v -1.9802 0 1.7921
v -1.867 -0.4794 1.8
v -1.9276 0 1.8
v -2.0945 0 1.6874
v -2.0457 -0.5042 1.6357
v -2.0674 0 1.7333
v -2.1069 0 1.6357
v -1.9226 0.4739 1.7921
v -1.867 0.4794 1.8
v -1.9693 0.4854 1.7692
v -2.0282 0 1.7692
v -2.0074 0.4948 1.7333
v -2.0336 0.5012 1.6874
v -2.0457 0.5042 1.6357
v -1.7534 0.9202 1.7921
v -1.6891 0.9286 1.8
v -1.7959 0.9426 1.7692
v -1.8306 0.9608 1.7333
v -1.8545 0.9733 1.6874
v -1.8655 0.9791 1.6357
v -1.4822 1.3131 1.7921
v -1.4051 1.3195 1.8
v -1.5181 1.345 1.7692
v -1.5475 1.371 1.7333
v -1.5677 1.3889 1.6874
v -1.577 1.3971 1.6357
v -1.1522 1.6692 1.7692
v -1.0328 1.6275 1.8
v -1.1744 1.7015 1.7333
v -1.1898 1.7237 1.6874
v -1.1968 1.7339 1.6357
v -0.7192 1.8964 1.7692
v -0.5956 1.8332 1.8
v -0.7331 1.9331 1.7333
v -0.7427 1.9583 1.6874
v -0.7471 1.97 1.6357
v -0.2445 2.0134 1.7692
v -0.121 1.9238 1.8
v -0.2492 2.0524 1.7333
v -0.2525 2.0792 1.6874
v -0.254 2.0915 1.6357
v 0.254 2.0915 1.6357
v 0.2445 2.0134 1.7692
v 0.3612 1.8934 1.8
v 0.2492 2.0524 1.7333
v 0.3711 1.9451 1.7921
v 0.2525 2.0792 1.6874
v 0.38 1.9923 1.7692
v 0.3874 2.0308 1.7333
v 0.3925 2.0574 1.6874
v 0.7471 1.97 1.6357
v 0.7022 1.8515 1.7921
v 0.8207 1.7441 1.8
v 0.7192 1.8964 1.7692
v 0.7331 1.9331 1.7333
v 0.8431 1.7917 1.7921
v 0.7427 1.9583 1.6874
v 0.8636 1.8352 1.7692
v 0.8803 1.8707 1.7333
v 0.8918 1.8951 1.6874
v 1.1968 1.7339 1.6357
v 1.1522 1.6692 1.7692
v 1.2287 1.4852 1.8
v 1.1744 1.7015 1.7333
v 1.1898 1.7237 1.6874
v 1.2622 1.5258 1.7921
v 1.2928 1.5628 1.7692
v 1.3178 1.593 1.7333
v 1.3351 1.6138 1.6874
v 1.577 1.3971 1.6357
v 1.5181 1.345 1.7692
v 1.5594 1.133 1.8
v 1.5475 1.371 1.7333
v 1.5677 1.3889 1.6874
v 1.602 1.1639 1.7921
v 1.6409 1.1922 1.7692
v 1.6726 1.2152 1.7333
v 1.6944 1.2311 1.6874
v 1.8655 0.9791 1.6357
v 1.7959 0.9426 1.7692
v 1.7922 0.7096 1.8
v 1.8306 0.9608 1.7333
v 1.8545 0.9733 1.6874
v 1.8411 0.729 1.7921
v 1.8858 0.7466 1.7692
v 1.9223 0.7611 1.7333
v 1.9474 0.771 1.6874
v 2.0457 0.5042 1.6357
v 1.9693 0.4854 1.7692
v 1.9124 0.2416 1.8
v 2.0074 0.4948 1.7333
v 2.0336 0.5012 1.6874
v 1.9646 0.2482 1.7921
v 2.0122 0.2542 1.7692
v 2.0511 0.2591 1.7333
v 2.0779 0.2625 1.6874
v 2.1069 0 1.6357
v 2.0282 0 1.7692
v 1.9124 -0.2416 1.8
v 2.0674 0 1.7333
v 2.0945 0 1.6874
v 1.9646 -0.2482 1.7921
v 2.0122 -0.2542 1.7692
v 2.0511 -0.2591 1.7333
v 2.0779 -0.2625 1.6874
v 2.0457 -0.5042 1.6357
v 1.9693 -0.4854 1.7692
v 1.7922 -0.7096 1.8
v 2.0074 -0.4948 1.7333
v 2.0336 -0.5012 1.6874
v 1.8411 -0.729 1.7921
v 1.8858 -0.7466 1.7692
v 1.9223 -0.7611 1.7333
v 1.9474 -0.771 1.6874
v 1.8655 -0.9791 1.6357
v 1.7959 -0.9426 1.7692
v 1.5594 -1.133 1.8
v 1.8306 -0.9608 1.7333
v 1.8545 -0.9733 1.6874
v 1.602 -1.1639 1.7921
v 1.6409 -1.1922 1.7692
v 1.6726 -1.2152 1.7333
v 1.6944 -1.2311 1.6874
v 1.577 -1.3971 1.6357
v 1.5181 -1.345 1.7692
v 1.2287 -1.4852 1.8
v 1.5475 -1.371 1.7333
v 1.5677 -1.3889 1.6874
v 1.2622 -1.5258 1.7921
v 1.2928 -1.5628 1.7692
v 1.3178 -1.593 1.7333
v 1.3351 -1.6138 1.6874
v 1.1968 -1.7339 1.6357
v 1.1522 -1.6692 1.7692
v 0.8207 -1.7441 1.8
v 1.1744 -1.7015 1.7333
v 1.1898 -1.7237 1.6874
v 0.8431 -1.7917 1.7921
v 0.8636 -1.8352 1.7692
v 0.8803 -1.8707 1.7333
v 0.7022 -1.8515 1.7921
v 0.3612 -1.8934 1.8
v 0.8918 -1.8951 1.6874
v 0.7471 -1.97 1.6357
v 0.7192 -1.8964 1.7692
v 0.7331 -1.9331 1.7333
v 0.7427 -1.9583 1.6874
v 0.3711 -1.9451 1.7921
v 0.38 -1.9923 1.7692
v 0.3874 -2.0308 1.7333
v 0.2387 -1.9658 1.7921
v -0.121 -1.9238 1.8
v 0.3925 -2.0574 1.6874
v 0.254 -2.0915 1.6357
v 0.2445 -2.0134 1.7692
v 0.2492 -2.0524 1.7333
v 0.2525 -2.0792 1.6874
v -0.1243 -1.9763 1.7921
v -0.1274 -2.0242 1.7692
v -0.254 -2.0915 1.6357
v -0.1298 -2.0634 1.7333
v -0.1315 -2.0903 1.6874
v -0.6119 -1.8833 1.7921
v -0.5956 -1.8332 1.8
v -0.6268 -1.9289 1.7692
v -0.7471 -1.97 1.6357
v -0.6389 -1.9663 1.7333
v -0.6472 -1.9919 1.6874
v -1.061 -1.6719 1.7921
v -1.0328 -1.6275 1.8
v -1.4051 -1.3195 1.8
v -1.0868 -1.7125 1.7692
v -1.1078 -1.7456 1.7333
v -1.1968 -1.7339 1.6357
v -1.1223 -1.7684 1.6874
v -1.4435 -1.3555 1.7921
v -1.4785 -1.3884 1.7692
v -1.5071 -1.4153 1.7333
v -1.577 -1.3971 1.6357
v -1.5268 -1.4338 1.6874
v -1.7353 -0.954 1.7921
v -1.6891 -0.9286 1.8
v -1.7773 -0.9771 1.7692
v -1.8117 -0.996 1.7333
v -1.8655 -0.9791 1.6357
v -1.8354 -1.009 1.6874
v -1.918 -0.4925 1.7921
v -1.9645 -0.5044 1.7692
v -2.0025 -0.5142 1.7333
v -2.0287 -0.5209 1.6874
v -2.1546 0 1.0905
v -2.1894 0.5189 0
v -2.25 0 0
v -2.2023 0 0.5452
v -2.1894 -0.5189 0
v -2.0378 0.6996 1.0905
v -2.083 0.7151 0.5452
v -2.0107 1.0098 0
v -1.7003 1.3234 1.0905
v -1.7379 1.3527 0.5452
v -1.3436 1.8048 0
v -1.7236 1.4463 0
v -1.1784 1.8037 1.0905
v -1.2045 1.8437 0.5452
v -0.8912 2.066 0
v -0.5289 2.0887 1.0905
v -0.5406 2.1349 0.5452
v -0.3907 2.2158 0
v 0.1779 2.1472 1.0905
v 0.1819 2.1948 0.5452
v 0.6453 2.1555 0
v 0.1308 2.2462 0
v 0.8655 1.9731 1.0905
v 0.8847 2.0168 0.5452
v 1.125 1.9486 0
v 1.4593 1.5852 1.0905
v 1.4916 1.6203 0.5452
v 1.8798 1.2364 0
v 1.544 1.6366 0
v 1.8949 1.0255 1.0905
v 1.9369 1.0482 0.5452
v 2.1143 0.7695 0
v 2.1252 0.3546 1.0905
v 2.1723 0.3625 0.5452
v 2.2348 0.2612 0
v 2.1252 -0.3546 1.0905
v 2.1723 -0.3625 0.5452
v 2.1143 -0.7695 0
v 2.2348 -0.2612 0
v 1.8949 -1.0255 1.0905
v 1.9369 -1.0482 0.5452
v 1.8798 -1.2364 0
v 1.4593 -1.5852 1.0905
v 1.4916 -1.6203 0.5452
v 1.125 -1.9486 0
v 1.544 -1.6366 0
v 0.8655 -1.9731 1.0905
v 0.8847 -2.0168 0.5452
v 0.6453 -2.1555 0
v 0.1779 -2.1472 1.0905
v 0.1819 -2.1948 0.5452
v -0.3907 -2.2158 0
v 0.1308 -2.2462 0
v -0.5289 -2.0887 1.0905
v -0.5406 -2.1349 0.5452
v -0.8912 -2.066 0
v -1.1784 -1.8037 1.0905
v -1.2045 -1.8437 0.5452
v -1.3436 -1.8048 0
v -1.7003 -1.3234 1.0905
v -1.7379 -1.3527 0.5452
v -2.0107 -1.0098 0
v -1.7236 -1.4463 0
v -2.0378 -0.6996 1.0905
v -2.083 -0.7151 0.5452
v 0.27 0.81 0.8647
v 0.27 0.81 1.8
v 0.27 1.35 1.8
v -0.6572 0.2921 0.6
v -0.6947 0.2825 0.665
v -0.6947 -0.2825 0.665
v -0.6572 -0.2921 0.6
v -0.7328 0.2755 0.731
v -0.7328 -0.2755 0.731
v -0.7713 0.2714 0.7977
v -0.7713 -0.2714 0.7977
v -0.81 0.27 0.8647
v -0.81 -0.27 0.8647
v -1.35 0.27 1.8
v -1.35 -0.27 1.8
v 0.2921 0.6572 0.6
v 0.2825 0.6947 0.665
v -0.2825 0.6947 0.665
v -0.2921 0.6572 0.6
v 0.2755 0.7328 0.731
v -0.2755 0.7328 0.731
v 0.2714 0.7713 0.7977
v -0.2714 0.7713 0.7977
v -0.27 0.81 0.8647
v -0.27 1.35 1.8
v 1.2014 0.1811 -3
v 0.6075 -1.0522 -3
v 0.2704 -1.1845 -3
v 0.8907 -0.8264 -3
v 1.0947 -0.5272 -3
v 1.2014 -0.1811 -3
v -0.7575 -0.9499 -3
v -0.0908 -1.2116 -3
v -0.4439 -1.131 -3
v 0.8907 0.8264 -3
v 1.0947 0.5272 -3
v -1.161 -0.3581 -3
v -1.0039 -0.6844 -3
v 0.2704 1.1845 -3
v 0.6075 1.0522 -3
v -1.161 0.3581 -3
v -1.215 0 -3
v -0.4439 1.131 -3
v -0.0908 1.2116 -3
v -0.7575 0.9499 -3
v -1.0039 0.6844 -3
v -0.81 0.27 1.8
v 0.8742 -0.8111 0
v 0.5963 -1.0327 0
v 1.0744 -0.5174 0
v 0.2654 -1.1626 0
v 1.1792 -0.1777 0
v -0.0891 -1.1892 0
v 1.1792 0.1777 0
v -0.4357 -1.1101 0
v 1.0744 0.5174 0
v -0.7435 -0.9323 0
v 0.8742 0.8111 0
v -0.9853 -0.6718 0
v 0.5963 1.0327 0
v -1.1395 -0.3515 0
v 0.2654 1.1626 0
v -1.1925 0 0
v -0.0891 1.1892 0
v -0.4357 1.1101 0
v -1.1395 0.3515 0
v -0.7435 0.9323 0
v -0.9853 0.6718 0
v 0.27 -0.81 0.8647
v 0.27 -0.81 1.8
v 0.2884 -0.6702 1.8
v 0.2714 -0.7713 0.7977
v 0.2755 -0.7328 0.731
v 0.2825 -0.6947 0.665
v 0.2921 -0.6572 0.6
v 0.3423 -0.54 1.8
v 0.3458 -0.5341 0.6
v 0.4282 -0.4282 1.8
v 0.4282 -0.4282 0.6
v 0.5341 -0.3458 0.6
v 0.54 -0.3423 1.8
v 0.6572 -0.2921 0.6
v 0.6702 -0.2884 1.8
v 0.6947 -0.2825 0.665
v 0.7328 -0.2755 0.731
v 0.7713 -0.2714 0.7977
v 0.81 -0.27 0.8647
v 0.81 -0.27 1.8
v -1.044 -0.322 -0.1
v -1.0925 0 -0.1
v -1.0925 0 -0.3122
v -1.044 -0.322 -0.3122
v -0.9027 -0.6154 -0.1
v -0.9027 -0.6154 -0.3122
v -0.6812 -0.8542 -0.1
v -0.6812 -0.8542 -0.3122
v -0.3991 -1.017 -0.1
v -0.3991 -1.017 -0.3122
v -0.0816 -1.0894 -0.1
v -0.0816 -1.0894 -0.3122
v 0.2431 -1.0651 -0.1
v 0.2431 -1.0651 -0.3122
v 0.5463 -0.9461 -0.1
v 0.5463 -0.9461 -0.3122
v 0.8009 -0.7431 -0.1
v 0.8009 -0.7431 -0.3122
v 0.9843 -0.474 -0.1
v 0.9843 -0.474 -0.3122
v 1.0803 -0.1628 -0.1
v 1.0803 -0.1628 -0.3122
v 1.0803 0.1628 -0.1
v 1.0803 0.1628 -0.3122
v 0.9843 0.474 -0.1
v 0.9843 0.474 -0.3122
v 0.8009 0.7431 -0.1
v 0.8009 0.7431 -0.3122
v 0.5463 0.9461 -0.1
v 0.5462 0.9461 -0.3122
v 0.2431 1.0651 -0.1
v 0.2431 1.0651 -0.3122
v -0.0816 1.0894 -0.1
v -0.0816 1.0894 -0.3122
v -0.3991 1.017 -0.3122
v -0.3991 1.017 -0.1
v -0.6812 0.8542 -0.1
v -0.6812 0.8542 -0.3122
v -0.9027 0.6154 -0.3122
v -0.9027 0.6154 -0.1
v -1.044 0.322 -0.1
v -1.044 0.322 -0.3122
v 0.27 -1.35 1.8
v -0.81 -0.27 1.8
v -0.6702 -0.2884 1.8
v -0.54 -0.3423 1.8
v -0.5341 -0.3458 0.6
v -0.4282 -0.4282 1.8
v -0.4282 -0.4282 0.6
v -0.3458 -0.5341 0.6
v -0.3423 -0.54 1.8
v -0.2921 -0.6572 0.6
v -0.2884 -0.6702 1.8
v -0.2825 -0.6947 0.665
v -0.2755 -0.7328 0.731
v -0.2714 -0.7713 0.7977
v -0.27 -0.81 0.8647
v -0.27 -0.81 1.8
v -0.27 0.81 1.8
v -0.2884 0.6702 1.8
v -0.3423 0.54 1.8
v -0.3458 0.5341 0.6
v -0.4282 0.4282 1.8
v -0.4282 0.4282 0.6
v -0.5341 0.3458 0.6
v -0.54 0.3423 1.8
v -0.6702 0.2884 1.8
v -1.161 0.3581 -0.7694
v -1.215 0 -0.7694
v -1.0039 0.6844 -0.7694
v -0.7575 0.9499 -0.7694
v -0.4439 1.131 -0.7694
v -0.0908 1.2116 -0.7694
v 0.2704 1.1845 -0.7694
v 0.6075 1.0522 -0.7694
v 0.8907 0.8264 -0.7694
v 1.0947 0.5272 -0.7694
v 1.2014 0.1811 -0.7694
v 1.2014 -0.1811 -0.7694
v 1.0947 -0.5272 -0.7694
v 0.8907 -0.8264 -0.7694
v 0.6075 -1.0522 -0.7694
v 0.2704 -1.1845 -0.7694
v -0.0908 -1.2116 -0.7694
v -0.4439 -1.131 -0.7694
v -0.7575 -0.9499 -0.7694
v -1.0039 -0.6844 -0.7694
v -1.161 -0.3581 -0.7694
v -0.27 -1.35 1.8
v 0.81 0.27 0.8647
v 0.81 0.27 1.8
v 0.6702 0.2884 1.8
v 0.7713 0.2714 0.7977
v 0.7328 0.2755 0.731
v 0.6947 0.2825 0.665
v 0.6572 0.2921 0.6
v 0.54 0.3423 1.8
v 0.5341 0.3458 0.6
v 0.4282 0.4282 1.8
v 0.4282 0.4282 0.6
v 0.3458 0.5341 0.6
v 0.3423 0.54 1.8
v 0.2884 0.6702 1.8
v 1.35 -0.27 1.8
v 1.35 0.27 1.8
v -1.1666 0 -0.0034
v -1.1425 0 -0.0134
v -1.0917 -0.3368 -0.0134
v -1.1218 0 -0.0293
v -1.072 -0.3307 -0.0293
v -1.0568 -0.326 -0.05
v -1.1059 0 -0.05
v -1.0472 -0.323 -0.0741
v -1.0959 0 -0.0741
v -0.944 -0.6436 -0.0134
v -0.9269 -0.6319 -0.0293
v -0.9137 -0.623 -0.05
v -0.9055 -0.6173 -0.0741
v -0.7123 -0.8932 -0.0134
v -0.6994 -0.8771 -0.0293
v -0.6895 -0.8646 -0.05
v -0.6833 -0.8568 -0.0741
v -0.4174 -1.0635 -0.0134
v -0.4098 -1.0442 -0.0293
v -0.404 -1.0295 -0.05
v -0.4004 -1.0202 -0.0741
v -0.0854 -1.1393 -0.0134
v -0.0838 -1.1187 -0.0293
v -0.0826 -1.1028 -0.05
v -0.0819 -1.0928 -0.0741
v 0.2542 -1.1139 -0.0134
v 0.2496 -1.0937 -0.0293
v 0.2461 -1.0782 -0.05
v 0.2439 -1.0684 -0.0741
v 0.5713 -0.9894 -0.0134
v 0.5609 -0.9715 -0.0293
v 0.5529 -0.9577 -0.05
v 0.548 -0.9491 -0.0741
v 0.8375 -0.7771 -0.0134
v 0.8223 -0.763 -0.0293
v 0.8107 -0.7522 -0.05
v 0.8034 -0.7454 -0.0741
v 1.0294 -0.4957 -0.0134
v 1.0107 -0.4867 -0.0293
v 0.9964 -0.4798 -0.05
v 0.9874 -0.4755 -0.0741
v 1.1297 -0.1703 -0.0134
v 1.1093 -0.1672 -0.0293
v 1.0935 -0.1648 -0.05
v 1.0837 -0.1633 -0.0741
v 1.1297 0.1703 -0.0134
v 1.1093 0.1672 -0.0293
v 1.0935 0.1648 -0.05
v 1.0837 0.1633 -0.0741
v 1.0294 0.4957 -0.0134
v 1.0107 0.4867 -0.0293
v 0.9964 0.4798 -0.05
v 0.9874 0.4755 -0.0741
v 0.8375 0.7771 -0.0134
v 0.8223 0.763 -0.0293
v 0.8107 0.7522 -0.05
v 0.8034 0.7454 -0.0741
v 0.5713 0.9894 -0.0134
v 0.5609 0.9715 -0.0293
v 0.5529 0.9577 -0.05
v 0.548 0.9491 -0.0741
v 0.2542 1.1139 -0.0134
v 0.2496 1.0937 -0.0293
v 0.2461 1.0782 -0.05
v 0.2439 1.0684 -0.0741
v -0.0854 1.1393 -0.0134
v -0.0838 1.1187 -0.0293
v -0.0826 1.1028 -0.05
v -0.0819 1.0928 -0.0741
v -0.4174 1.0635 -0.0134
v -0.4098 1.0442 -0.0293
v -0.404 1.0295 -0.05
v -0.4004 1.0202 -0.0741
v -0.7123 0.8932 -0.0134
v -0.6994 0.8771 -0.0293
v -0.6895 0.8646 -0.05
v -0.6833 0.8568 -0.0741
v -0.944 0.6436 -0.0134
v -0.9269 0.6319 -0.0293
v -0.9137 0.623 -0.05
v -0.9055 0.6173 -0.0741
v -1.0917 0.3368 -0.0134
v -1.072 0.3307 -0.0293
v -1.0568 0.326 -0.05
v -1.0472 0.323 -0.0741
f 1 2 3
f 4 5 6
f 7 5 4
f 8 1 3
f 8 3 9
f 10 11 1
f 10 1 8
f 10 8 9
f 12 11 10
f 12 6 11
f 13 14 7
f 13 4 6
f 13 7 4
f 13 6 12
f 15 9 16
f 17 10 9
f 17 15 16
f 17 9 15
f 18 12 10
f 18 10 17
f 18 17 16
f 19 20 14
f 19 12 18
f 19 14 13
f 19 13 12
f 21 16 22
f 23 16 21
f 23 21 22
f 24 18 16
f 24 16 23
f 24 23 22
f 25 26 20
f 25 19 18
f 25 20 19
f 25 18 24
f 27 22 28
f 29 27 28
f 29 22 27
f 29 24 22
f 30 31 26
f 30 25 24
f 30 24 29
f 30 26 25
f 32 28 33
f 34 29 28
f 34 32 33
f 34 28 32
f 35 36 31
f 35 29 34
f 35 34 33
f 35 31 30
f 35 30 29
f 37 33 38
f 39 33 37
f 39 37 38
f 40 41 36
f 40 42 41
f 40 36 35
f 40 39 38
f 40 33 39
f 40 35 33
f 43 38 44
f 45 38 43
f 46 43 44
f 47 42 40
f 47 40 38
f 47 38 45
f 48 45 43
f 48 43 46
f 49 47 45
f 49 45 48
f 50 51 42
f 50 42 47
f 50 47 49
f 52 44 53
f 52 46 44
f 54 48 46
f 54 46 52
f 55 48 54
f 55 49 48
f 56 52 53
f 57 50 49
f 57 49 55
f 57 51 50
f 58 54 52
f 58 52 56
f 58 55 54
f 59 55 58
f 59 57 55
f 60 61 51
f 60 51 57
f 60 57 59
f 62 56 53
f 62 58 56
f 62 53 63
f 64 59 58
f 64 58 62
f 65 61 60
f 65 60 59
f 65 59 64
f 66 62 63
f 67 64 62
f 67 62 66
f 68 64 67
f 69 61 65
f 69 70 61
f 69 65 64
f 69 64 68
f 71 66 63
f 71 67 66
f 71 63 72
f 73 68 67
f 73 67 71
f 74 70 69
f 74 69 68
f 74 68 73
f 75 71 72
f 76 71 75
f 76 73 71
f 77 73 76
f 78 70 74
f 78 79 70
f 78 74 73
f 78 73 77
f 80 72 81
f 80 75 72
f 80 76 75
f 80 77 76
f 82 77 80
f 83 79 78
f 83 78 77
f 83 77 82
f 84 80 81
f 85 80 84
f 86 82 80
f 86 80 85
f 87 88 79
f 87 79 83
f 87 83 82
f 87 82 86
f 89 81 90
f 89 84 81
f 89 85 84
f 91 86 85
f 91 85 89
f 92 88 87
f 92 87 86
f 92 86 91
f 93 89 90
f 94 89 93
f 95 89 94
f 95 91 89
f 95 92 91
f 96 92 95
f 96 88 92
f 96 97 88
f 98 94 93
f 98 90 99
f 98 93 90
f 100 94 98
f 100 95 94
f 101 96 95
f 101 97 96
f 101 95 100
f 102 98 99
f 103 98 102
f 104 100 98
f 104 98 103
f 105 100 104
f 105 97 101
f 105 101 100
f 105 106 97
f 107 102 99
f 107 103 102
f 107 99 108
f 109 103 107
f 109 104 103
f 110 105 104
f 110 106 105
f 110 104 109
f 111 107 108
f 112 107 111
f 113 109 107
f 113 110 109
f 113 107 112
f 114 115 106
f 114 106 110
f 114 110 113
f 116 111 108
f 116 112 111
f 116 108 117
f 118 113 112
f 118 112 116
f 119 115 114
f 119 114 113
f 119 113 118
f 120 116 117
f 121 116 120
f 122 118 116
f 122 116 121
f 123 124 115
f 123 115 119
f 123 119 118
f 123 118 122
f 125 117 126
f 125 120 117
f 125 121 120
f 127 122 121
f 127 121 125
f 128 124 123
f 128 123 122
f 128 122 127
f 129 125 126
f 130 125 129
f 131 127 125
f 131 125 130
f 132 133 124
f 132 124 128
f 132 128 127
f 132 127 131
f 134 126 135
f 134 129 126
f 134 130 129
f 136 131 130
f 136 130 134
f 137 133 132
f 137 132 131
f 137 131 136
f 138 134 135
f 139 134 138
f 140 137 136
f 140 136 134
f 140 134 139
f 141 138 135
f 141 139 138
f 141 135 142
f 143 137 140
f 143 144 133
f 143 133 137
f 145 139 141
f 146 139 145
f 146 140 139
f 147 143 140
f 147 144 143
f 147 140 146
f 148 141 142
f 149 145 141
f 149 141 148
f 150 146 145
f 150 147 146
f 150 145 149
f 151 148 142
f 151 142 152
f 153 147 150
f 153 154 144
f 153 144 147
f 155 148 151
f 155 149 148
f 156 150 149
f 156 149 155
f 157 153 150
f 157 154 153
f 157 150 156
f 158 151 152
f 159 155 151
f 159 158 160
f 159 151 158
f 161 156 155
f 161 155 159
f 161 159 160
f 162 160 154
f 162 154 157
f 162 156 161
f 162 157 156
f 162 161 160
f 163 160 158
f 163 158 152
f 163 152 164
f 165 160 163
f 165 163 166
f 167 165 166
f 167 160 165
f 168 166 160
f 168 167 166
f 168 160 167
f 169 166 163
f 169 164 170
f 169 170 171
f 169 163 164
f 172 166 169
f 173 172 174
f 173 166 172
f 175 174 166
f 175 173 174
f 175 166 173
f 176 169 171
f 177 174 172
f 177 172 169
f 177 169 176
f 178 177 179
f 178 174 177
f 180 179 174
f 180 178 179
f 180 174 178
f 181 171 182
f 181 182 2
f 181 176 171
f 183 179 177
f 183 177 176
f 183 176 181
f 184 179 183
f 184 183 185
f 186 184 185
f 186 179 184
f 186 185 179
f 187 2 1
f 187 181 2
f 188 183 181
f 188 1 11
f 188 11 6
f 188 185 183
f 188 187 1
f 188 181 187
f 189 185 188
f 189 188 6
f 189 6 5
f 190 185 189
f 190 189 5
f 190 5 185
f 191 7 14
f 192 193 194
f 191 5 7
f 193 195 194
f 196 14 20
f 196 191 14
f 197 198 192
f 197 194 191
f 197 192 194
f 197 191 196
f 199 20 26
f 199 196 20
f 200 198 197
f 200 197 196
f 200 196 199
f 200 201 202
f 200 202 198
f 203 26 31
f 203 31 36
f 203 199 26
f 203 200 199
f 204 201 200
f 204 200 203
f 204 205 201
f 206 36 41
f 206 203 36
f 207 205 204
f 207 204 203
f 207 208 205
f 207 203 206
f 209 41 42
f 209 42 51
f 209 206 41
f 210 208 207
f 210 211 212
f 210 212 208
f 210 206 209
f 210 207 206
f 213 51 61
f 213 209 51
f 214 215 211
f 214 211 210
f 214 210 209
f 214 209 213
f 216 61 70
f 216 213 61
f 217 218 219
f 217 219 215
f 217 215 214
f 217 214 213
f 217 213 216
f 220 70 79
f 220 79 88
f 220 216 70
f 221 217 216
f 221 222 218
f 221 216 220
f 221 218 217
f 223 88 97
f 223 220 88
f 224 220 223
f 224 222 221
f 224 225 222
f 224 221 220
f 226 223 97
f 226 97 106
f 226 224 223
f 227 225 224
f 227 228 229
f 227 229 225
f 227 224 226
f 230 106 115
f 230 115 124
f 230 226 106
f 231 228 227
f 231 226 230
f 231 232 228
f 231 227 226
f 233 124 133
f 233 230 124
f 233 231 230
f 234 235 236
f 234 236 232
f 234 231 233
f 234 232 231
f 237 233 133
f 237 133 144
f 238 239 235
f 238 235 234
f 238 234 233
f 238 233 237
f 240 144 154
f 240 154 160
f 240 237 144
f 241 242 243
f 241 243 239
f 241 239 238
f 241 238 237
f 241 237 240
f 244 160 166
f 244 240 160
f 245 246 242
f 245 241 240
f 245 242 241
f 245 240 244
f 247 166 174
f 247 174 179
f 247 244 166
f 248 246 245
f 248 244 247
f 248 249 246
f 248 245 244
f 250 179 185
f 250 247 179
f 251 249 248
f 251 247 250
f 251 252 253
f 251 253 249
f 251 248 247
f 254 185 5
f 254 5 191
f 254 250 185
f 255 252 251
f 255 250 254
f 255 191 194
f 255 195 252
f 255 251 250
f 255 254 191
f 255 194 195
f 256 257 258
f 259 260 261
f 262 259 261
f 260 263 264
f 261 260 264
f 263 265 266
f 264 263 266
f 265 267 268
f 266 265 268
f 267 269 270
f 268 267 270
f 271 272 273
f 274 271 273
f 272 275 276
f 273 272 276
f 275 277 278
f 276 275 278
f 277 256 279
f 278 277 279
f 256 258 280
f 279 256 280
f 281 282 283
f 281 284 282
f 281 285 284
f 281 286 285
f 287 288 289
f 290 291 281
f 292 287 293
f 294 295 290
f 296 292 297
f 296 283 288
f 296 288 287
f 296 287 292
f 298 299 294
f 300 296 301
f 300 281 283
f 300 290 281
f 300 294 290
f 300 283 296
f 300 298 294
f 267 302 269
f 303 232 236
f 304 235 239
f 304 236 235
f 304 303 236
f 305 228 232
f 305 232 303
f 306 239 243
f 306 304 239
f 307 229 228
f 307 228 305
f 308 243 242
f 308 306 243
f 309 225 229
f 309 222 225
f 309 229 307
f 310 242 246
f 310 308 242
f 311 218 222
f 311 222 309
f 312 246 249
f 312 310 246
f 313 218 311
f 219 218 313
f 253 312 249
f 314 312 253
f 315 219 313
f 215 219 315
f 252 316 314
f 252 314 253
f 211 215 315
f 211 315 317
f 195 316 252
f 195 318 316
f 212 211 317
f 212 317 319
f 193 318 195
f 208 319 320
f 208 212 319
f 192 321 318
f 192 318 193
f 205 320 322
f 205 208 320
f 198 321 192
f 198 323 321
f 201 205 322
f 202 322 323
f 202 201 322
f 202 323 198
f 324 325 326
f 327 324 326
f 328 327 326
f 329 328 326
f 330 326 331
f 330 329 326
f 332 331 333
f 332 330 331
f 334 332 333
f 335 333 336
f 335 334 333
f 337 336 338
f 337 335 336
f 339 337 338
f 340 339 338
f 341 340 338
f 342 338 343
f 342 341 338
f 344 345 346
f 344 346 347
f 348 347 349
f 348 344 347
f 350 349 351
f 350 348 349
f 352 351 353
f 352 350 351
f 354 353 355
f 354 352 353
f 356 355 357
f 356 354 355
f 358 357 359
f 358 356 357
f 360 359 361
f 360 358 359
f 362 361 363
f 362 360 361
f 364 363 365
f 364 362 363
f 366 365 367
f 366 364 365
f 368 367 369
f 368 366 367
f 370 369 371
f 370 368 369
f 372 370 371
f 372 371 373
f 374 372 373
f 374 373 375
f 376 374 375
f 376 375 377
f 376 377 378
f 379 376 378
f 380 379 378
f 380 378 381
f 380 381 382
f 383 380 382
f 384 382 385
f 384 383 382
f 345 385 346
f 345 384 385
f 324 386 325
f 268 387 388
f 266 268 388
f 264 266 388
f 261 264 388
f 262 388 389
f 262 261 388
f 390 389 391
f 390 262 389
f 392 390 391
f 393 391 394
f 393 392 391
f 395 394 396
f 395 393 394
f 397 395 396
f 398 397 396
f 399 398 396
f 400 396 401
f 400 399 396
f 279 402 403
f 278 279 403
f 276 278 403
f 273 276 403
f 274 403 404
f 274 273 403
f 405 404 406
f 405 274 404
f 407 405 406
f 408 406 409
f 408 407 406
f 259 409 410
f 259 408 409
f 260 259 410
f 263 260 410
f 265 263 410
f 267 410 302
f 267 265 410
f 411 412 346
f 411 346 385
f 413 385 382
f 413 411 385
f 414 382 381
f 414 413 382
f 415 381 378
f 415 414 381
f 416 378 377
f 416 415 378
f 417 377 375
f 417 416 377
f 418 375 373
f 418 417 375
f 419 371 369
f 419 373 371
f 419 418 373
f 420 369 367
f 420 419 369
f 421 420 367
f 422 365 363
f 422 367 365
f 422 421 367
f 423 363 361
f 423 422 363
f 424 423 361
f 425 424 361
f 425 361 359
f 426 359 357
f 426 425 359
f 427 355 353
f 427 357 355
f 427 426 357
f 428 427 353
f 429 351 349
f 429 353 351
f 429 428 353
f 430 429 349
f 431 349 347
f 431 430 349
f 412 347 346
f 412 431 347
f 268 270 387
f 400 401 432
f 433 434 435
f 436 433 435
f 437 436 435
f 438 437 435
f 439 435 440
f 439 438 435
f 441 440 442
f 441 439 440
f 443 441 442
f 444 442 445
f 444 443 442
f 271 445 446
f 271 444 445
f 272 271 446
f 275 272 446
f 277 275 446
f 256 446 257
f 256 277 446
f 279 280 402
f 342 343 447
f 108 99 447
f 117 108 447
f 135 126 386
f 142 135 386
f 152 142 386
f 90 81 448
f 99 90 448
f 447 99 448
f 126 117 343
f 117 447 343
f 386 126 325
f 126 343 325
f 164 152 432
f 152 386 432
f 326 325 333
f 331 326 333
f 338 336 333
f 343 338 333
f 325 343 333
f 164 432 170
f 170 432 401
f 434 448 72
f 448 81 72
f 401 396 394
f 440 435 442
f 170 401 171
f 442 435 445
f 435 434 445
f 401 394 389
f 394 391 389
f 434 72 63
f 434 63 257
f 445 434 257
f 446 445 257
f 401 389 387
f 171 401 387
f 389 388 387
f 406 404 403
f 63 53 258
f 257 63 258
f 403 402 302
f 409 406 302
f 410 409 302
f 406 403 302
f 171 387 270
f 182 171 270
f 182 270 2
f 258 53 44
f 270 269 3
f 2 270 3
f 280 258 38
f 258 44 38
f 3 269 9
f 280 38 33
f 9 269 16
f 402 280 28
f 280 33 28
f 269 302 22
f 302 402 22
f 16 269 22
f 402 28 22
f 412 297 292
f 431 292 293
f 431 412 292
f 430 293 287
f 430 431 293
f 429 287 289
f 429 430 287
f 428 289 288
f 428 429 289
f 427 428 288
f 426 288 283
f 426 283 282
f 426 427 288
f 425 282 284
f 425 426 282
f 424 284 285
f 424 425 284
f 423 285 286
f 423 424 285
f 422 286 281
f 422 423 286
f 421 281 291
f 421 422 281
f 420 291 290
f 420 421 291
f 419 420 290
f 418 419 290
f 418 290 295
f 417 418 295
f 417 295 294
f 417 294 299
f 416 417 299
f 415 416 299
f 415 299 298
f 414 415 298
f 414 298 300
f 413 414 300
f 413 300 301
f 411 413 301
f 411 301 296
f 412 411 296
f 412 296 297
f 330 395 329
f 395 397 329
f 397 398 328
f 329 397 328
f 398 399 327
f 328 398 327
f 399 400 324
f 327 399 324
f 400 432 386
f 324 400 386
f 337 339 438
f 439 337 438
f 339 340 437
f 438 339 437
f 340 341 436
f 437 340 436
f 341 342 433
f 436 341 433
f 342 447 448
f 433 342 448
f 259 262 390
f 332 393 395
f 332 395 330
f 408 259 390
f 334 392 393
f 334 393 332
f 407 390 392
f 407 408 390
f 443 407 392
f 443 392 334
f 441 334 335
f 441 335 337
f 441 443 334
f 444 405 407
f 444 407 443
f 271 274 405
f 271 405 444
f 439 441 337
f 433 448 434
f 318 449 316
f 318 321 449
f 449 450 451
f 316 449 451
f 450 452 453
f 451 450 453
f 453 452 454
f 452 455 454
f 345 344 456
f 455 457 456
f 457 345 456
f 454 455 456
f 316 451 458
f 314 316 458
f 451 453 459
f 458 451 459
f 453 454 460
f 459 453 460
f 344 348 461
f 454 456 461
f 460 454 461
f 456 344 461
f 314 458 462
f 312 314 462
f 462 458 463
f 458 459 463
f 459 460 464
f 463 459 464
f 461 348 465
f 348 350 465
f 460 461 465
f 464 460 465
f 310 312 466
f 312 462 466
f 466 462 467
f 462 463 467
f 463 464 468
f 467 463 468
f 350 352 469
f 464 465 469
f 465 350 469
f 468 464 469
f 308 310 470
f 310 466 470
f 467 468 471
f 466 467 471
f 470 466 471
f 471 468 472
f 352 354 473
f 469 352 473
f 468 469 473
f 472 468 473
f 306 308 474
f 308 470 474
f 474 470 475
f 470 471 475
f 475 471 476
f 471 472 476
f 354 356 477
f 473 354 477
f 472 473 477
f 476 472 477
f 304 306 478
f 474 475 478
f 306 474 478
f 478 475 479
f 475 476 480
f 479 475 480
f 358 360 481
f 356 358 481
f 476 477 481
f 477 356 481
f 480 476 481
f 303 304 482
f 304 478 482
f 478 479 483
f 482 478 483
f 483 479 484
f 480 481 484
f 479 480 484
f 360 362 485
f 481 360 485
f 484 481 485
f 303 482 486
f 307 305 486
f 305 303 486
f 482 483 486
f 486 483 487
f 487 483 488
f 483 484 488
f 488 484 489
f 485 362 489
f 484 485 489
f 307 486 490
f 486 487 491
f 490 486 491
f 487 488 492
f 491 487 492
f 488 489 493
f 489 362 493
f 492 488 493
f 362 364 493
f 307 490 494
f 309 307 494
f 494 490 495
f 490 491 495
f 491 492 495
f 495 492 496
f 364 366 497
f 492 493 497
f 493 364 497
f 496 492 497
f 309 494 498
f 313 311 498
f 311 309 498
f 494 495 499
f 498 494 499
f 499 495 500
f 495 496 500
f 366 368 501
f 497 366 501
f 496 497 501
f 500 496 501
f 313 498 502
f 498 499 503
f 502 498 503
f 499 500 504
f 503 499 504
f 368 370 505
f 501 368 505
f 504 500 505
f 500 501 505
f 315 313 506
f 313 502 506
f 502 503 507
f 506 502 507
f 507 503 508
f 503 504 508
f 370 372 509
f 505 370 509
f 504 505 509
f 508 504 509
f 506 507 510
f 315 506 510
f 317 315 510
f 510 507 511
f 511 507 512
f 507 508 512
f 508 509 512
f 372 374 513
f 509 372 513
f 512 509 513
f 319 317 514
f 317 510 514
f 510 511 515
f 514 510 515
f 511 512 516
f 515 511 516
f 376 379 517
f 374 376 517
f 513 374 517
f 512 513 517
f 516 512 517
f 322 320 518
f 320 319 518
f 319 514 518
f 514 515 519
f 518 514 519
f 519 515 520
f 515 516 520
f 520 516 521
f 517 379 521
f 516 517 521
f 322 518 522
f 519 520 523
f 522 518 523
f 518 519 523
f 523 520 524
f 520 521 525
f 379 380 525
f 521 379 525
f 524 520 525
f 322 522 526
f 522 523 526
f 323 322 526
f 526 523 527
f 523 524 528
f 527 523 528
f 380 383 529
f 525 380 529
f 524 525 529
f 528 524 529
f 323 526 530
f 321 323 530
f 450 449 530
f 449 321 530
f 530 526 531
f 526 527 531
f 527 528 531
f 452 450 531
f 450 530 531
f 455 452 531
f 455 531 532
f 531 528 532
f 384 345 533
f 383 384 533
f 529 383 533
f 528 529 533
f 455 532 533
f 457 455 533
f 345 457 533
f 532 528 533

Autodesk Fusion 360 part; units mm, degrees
sketch "Sketch1" plane through (0, 0, 0) normal (0, 1, 0) x (1, 0, 0)
  line L0 (0, -1.8) -> (0, 3)
  line L1 (-2.25, 0) -> (-2.0925, -1.8)
  line L2 (-2.25, 0) -> (-1.0925, 0)
  line L3 (0, 3) -> (-1.25, 3)
  line L4 (-1.25, 3) -> (-1.25, 0.9)
  line L5 (-1.25, 0.9) -> (-1.0925, 0.3122)
  line L6 (-1.0925, 0.3122) -> (-1.0925, 0)
  line L7 (0, -1.8) -> (-2.0925, -1.8)
  dimension "d13" = 5
  dimension "d14" = 4.5
  dimension "d18" = 2.5
  dimension "d56" = 3
  dimension "d65" = 15
  dimension "d67" = 1.8
  dimension "d71" = 2.185
  dimension "d77" = 0.9
revolve "Revolve1" add sketch "Sketch1" angle 360 about axis through (0, 0, 1.8) along (0, 0, -1) makes body 1
fillet "Fillet3" radius 0.18 1 edges at (-1.9509, 0.7567, 1.8) on bodies 1
fillet "Fillet2" radius 0.1 1 edges at (-1.0186, 0.3951, 0) on bodies 1
sketch "Sketch2" plane through (0, 0, 1.8) normal (0, 0, 1) x (1, 0, 0)
  line L0 (-0.27, 0.27) -> (-1.35, 0.27)
  line L1 (-1.35, 0.27) -> (-1.35, -0.27)
  line L2 (-1.35, -0.27) -> (-0.27, -0.27)
  line L3 (-0.27, -0.27) -> (-0.27, -1.35)
  line L4 (-0.27, -1.35) -> (0.27, -1.35)
  line L5 (0.27, -1.35) -> (0.27, -0.27)
  line L6 (0.27, -0.27) -> (1.35, -0.27)
  line L7 (1.35, -0.27) -> (1.35, 0.27)
  line L8 (1.35, 0.27) -> (0.27, 0.27)
  line L9 (0.27, 0.27) -> (0.27, 1.35)
  line L10 (0.27, 1.35) -> (-0.27, 1.35)
  line L11 (-0.27, 1.35) -> (-0.27, 0.27)
  dimension "d81" = 360
  dimension "d83" = 0.54
  dimension "d84" = 2.7
extrude "Extrude1" add sketch "Sketch2" against normal blind 1.2 separate body makes body 2
draft "Draft1" angle -30 neutral plane through (0, 0, 1.8) pull (0, 0, 1) 4 faces at (1.35, 0.09, 1) (0.09, 1.35, 1.4) (-1.35, 0.09, 1.4) (-0.09, -1.35, 1.4) on bodies 2
fillet "Fillet1" radius 0.54 4 edges at (-0.27, 0.27, 1.2) (-0.27, -0.27, 1.2) (0.27, -0.27, 1.2) (0.27, 0.27, 1.2) on bodies 2
combine "Combine1" operation cut target body 1 tool bodies 2
thread "Thread3" "ISO Metric profile 2.5 M2.5x0.45 M2.5x0.45 6g" major diameter 2.43 minor diameter 1.9165 pitch 0.45 angle 60 resizes the face on face at (-1.2484, -0.0623, -2.3) on bodies 1
equation "adsk_nomdia = 2.50 mm"
equation "adsk_nomlen = 3.00 mm"
equation "adsk_headdia = 4.50 mm"
equation "adsk_phildia = 2.70 mm"
equation "adsk_midfillet = 0.10 mm"
equation "adsk_phildepth = 1.20 mm"
equation "adsk_shnklen = 0.90 mm"
equation "adsk_thrang = 15 deg"
equation "adsk_headang = 5 deg"
equation "d13 = adsk_headang"
equation "d14 = adsk_headdia"
equation "d18 = adsk_nomdia"
equation "adsk_philwidth = 0.54 mm"
equation "d43 = -adsk_phildepth"
equation "d52 = adsk_midfillet"
equation "d56 = adsk_nomlen"
equation "d65 = adsk_thrang"
equation "d67 = adsk_headh"
equation "adsk_headh = 1.80 mm"
equation "adsk_pitch1 = 0.45 mm"
equation "adsk_shnkdia = adsk_nomdia - 0.7 * adsk_pitch1"
equation "d71 = adsk_shnkdia"
equation "adsk_headtoprad = adsk_headh * 0.1"
equation "d76 = adsk_headtoprad"
equation "d77 = adsk_shnklen"
equation "d83 = adsk_philwidth"
equation "d84 = adsk_phildia"
equation "d86 = adsk_philwidth"
properties part number "BS EN ISO 7048 - H - M2.5 x 3 Steel 4.6 Plain"
